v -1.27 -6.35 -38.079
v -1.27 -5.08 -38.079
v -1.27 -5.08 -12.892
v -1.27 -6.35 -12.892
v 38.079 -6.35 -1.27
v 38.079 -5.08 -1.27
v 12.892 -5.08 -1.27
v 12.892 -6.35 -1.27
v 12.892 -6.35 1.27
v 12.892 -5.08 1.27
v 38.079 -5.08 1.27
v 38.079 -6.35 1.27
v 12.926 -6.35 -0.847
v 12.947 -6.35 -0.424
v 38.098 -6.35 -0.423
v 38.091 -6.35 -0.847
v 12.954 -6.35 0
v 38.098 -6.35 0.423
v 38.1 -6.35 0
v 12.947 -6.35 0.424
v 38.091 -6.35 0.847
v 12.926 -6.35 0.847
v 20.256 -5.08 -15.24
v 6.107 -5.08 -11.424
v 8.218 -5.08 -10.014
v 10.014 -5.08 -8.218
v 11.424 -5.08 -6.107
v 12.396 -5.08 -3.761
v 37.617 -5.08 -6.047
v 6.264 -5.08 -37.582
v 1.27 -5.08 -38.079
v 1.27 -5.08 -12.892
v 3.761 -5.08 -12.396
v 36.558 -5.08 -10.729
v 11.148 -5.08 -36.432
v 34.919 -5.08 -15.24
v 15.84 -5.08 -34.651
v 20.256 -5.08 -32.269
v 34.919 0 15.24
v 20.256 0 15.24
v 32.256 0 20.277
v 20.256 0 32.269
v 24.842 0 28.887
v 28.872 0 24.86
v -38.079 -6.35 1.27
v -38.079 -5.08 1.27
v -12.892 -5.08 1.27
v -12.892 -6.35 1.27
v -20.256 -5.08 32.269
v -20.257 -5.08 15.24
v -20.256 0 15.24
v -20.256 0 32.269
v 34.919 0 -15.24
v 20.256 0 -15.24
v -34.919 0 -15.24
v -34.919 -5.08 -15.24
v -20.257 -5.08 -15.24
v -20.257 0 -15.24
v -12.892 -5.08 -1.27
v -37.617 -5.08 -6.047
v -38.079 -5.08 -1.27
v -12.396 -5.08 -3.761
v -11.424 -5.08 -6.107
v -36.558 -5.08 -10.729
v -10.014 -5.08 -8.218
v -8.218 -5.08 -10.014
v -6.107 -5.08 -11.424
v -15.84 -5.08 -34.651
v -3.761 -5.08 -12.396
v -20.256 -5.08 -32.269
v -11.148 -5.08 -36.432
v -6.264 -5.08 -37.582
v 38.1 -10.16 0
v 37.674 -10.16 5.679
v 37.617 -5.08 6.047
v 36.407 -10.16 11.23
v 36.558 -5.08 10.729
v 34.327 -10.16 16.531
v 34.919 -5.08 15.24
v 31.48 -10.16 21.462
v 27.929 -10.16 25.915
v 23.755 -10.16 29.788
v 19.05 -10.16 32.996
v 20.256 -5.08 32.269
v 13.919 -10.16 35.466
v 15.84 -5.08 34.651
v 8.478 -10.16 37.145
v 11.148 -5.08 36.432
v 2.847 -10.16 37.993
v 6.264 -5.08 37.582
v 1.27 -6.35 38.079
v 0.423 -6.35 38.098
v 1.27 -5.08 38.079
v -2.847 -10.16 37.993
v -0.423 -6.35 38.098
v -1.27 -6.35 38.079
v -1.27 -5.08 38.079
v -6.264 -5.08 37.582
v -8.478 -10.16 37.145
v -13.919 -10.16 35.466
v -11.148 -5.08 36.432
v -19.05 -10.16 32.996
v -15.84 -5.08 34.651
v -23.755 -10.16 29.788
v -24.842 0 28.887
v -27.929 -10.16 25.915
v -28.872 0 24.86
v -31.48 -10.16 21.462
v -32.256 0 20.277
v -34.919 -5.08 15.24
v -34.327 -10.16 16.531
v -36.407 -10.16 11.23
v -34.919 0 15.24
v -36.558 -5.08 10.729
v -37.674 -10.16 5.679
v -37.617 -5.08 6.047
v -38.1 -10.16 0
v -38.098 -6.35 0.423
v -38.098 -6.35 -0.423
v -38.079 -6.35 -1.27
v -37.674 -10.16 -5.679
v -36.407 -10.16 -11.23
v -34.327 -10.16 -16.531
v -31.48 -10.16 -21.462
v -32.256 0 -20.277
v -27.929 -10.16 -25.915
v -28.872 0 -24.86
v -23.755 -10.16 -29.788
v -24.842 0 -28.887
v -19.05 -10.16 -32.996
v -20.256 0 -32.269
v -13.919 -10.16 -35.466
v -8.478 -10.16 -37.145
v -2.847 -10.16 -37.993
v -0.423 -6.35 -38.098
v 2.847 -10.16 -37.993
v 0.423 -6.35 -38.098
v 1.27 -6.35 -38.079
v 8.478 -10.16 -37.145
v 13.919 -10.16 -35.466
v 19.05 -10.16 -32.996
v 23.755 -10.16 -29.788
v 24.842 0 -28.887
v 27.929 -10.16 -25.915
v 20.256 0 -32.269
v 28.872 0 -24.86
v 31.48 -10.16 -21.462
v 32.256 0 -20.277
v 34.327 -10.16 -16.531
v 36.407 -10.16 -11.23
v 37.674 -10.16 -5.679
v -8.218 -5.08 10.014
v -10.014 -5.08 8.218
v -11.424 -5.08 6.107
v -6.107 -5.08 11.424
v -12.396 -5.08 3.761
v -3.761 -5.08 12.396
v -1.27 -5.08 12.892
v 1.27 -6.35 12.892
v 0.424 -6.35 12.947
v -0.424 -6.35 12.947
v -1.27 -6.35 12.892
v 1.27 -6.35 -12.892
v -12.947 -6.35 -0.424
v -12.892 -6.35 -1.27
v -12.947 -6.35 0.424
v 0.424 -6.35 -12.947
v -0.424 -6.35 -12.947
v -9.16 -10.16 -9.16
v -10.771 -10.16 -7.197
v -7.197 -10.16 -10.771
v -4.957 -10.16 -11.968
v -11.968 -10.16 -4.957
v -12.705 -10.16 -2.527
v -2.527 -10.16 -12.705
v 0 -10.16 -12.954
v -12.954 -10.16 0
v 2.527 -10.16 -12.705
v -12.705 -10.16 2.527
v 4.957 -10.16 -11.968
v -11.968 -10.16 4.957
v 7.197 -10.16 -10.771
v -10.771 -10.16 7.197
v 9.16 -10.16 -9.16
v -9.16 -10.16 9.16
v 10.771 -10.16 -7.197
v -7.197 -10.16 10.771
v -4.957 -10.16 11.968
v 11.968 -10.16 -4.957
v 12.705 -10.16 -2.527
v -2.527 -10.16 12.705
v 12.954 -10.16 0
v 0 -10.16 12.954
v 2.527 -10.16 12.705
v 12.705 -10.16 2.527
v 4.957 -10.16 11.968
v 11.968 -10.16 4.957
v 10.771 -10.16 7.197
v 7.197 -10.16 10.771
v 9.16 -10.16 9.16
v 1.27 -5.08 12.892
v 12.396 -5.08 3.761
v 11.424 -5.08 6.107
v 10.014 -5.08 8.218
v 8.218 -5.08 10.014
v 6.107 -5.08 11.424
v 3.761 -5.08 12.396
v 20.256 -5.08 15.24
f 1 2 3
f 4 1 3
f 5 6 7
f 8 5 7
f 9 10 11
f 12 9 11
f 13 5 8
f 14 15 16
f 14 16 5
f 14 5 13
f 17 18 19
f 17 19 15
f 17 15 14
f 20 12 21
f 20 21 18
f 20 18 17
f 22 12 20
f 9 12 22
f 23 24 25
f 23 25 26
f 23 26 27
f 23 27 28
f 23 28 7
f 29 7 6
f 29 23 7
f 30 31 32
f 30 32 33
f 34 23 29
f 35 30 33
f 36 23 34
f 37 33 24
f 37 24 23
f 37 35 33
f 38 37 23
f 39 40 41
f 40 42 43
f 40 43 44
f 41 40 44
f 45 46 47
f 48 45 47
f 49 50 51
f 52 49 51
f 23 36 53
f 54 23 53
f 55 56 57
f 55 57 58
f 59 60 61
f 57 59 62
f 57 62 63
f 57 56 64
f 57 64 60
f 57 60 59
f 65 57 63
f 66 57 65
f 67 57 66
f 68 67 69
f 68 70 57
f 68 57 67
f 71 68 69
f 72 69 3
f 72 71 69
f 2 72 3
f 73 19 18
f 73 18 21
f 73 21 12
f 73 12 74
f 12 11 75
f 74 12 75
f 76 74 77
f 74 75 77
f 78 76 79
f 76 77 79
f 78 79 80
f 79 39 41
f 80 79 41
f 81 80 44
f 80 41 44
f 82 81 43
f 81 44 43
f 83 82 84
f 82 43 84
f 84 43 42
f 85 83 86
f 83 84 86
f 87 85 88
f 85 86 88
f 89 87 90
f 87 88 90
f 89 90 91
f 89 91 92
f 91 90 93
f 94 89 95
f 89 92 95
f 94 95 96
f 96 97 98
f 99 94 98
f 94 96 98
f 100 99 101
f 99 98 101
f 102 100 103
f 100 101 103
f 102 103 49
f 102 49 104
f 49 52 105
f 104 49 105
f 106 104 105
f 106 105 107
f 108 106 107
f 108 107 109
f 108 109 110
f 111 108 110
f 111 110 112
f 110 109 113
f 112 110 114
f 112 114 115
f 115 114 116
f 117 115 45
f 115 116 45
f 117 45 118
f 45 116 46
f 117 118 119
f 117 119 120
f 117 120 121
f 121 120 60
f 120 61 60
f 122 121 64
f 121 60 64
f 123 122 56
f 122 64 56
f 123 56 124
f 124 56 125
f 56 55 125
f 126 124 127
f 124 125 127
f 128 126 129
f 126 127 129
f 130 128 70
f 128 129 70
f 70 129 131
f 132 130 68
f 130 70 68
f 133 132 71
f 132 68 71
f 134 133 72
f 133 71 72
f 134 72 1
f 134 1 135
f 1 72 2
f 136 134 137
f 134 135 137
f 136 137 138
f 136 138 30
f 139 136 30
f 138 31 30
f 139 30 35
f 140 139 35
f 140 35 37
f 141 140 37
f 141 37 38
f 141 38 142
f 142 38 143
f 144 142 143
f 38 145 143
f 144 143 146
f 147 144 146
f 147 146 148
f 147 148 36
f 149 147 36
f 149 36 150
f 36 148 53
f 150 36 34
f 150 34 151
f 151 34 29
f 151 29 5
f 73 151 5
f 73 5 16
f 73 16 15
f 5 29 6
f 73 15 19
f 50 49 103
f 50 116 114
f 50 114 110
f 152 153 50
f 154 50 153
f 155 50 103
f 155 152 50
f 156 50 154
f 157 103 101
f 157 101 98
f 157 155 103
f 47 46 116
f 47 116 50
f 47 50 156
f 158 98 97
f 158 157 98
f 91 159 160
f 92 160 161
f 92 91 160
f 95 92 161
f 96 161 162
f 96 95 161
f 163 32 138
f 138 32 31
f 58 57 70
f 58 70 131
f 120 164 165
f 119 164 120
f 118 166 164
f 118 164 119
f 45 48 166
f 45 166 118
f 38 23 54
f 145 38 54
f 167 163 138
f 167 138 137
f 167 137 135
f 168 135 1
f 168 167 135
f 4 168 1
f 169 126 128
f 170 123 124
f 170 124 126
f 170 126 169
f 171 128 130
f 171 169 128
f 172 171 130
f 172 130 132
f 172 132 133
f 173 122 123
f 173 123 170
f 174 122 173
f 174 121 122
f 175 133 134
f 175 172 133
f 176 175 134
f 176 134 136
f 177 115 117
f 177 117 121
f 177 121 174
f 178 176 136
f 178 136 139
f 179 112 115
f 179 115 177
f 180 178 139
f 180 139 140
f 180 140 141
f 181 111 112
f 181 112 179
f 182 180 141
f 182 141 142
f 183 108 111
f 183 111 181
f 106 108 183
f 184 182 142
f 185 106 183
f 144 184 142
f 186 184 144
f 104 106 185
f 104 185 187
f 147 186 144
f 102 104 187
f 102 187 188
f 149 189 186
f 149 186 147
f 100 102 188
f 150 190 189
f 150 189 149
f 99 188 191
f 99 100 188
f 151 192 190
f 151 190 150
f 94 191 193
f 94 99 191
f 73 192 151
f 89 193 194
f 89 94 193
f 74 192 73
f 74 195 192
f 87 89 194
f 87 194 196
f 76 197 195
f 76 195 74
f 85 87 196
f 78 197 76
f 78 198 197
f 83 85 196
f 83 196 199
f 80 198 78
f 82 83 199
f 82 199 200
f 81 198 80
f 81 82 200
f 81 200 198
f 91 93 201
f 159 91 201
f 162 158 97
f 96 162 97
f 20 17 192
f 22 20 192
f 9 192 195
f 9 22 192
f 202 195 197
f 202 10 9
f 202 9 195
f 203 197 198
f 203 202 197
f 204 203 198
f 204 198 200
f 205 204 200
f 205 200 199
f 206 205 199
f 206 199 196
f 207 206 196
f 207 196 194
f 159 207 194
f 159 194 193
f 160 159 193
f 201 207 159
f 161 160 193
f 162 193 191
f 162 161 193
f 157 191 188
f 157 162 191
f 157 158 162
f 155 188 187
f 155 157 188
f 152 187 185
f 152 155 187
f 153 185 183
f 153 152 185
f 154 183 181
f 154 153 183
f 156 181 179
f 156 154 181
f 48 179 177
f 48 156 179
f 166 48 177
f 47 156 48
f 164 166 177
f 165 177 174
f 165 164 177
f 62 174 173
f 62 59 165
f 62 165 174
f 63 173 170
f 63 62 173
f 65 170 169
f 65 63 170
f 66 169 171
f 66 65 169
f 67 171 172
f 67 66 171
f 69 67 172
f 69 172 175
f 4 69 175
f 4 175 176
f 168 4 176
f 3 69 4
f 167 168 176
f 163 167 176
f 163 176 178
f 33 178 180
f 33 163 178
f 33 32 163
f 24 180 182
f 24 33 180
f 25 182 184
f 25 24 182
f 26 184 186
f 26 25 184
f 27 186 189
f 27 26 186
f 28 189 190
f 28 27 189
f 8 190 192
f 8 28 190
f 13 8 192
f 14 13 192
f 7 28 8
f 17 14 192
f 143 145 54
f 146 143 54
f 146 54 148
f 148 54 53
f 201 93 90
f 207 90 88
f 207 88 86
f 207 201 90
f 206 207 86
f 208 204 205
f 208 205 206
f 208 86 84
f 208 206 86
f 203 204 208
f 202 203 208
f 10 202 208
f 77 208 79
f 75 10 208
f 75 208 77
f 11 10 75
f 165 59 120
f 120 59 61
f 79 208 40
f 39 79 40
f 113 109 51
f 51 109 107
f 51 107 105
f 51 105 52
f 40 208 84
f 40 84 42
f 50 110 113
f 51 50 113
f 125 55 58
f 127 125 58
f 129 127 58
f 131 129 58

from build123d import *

# Parameters (mm, degrees)
F0_R          = 12.7
F1_DEPTH      = 17.78
F2_R          = 38.1
F3_DEPTH      = 10.16
F4_R          = 12.954
F5_DEPTH      = 17.781
F5_DEPTH_BACK = 115
F6_W          = 5.08
F6_H          = 30.48
F7_DEPTH      = 38.101
F7_DEPTH_BACK = 38.101
F8_W          = 40.513
F8_H          = 5.08
F9_DEPTH      = 38.101
F9_DEPTH_BACK = 38.101
F11_DEPTH     = 6.35


# Not quite as in the source:
# - an extrude ends at something that could not be found from the text; its depth is read off the source's solid


with BuildPart() as f1:
    # F0 (on Front) → F1 (new body)
    with BuildSketch(Plane.XZ):
        Circle(F0_R)
    extrude(amount=F1_DEPTH)

    # F2 (on Front) → F3 (join)
    with BuildSketch(Plane.XZ):
        Circle(F2_R)
    extrude(amount=F3_DEPTH)

    # F4 (on Front) → F5 (cut, two sides)
    with BuildSketch(Plane.XZ) as f5_sk:
        Circle(F4_R)
    extrude(amount=F5_DEPTH, mode=Mode.SUBTRACT)
    extrude(f5_sk.sketch, amount=-F5_DEPTH_BACK, mode=Mode.SUBTRACT)

    # F6 (on Right) → F7 (cut, two sides)
    with BuildSketch(Plane.YZ) as f7_sk:
        with Locations((-2.54, 0)):
            Rectangle(F6_W, F6_H)
    extrude(amount=F7_DEPTH, mode=Mode.SUBTRACT)
    extrude(f7_sk.sketch, amount=-F7_DEPTH_BACK, mode=Mode.SUBTRACT)

    # F8 (on Top) → F9 (cut, two sides)
    with BuildSketch(Plane.XY) as f9_sk:
        with Locations((0, -2.54)):
            Rectangle(F8_W, F8_H)
    extrude(amount=-F9_DEPTH, mode=Mode.SUBTRACT)
    extrude(f9_sk.sketch, amount=F9_DEPTH_BACK, mode=Mode.SUBTRACT)

    # F10 (on face) → F11 (cut)
    with BuildSketch(Plane(origin=(0, 0, 0), x_dir=(-1, 0, 0), z_dir=(0, 1, 0))):
        with BuildLine():
            Line((1.27, -1.27), (38.0788274504, -1.27))
            ThreePointArc((38.0788274504, -1.27), (38.1, 0), (38.0788274504, 1.27))
            Line((38.0788274504, 1.27), (1.27, 1.27))
            Line((1.27, 1.27), (1.27, 38.0788274504))
            ThreePointArc((1.27, 38.0788274504), (0, 38.1), (-1.27, 38.0788274504))
            Line((-1.27, 38.0788274504), (-1.27, 1.27))
            Line((-1.27, 1.27), (-38.0788274504, 1.27))
            ThreePointArc((-38.0788274504, 1.27), (-38.1, 0), (-38.0788274504, -1.27))
            Line((-38.0788274504, -1.27), (-1.27, -1.27))
            Line((-1.27, -1.27), (-1.27, -38.0788274504))
            ThreePointArc((-1.27, -38.0788274504), (0, -38.1), (1.27, -38.0788274504))
            Line((1.27, -38.0788274504), (1.27, -1.27))
        make_face()
    extrude(amount=-F11_DEPTH, mode=Mode.SUBTRACT)


solid = f1.part
